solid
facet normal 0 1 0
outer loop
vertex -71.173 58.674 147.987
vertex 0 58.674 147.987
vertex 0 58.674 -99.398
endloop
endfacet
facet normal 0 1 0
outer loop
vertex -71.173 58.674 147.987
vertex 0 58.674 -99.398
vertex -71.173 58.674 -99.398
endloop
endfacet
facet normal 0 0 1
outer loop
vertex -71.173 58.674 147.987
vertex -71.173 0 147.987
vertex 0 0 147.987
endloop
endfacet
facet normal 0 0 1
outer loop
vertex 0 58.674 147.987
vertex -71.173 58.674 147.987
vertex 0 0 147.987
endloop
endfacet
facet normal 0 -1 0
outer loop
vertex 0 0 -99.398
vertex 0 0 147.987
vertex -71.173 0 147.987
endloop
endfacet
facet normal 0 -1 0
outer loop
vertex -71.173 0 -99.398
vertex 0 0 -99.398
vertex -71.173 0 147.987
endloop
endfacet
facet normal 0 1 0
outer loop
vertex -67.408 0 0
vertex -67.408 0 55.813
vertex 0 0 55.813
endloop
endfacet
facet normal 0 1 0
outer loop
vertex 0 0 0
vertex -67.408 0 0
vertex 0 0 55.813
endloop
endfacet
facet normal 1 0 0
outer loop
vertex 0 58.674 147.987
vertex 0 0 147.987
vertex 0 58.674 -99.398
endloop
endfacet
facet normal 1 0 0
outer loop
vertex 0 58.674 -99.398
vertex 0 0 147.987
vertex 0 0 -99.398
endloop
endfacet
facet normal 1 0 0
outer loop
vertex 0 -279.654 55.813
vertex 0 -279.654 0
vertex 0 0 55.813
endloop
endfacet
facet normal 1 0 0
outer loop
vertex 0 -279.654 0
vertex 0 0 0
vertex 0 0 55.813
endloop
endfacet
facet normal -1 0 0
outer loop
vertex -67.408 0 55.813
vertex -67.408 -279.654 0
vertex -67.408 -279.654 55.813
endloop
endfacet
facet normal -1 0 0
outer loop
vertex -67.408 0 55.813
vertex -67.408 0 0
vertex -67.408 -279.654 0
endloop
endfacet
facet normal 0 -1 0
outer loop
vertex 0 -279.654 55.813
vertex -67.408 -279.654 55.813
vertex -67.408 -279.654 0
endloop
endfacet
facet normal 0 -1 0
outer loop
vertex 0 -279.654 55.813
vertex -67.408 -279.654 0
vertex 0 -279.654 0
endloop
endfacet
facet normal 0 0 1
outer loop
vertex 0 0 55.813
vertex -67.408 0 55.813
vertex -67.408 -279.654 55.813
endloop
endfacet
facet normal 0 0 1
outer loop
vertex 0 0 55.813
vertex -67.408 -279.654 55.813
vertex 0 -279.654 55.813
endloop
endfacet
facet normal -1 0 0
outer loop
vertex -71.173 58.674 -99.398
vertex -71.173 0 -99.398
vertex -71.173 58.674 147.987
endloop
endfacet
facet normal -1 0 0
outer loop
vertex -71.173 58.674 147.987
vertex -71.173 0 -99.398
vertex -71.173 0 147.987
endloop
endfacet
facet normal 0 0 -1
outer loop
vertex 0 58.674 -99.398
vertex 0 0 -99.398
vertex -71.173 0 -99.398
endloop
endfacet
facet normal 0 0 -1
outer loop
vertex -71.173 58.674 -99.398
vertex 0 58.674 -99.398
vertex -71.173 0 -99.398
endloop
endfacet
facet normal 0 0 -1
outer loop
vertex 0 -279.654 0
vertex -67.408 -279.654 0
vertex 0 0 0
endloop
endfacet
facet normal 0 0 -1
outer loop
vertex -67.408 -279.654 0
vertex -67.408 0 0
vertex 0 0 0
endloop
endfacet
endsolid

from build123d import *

# Parameters (mm, degrees)
F0_W      = 67.40779
F0_H      = 55.81269
F1_DEPTH  = 25.4
F1_FACE_W = 67.40779
F1_FACE_H = 55.81269
F2_DEPTH  = 254.254
F3_W      = 67.40779
F3_H      = 55.81269
F4_DEPTH  = 58.674


with BuildPart() as f1:
    # F0 (on Front) → F1 (new body)
    with BuildSketch(Plane.XZ):
        with Locations((-33.703895, 27.906345)):
            Rectangle(F0_W, F0_H)
    extrude(amount=F1_DEPTH)

    # F1_face (on face) → F2 (join)
    with BuildSketch(Plane(origin=(-33.703895, -25.4, 27.906345), x_dir=(1, 0, 0), z_dir=(0, -1, 0))):
        Rectangle(F1_FACE_W, F1_FACE_H)
    extrude(amount=F2_DEPTH)


with BuildPart() as f4:
    # F3 (on face) → F4 (new body)
    with BuildSketch(Plane(origin=(0, 0, 0), x_dir=(-1, 0, 0), z_dir=(0, 1, 0))):
        Polygon((71.172796, -99.397629), (71.172796, 147.98741), (0, 147.98741), (0, 55.81269), (67.40779, 55.81269), (67.40779, 0), (0, 0), (0, -99.397629), align=None)
        with Locations((33.703895, 27.906345)):
            Rectangle(F3_W, F3_H)
    extrude(amount=F4_DEPTH)


solid = Compound([f1.part, f4.part])
